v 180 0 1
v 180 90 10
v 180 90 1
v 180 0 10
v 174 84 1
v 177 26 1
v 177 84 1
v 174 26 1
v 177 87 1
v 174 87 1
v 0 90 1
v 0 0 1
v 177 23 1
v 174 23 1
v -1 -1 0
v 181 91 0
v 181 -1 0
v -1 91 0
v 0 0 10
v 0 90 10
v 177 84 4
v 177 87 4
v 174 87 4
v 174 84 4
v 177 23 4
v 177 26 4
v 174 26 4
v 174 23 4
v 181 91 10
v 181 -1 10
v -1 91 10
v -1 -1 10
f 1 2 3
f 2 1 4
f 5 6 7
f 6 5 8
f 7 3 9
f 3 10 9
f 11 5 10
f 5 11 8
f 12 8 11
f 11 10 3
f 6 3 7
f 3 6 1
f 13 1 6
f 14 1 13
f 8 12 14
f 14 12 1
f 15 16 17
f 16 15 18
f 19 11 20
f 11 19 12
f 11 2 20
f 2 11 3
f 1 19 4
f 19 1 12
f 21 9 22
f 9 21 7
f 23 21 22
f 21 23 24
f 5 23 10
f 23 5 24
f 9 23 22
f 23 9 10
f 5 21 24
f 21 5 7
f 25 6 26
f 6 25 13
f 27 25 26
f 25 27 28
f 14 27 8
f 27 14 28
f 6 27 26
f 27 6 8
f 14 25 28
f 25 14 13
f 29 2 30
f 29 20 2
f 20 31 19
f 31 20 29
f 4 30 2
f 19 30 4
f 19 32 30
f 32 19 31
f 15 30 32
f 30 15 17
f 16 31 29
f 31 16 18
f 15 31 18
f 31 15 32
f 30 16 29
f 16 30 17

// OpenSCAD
wall = 1;
width = 180;
length = 90;
bottomwallheight = 10;

keyplanesupport = 3;

cube([width, length, wall]);
translate([width-3*wall-keyplanesupport, length-3*wall-keyplanesupport, wall])
    cube([keyplanesupport, keyplanesupport, keyplanesupport]);
translate([width-3*wall-keyplanesupport, 3*wall+20, wall])
    cube([keyplanesupport, keyplanesupport, keyplanesupport]);

translate([0,-wall,0])
    cube([width, wall, bottomwallheight]);
translate([0,length,0])
    cube([width, wall, bottomwallheight]);
translate([-wall,-wall,0])
    cube([wall, length+2*wall, bottomwallheight]);
translate([width,-wall,0])
    cube([wall, length+2*wall, bottomwallheight]);
